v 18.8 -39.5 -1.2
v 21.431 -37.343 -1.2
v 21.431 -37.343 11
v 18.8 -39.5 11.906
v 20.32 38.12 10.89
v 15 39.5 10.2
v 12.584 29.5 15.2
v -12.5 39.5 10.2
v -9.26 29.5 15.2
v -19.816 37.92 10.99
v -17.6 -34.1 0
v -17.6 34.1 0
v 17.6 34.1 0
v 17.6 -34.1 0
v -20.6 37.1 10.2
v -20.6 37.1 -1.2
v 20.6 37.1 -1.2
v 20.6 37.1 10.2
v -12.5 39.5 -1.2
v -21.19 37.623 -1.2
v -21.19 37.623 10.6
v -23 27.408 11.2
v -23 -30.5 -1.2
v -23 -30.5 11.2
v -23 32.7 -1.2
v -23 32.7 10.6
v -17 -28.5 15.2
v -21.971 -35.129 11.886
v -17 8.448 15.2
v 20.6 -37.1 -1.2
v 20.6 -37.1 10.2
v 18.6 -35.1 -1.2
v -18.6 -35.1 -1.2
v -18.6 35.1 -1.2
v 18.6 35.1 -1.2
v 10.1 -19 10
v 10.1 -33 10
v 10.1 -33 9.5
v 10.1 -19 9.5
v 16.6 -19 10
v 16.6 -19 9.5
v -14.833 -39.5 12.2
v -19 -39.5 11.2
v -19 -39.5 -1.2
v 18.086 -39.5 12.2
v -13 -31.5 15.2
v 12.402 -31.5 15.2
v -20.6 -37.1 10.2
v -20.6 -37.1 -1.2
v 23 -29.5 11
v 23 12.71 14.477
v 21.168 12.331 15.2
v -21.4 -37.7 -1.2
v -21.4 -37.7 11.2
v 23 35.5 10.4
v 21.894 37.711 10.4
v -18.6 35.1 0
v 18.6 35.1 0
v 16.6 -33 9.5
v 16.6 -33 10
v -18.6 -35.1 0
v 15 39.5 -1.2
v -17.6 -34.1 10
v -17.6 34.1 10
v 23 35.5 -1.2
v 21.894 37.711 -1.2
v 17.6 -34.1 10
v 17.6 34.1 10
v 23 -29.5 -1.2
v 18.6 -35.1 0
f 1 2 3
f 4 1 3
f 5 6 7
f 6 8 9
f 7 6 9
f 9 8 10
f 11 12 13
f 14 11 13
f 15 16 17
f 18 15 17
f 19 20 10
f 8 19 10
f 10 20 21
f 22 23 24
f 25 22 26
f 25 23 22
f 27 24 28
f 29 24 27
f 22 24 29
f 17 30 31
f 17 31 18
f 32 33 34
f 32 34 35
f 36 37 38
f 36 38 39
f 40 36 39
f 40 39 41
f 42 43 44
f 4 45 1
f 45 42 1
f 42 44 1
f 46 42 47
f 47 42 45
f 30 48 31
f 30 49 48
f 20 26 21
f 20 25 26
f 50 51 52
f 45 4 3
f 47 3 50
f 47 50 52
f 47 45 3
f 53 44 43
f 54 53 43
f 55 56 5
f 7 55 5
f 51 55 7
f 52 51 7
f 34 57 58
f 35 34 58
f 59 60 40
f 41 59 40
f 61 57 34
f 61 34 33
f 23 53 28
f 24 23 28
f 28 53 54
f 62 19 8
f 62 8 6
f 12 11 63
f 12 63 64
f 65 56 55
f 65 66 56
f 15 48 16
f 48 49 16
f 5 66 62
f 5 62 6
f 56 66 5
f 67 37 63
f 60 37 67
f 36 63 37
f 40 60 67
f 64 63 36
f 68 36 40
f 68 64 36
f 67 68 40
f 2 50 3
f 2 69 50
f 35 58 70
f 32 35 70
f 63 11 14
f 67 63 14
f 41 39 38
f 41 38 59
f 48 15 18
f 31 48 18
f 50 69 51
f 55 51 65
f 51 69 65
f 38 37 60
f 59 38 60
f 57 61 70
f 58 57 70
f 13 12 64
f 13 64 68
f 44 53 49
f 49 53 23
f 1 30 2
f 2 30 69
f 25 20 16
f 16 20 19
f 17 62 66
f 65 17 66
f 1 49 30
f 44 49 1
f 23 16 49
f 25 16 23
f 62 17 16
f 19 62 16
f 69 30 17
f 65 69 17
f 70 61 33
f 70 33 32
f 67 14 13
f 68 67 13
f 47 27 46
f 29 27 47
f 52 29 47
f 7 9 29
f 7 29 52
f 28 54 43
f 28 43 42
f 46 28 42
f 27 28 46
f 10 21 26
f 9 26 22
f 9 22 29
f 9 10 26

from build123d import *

# Parameters (mm, degrees)
F0_W          = 35.2
F0_H          = 68.2
F1_DEPTH      = 10
F2_W          = 6.5
F2_H          = 14
F3_DEPTH      = 0.5
F4_W          = 37.2
F4_H          = 70.2
F5_DEPTH      = 1.2
F6_W          = 46
F6_H          = 79
F6_W_2        = 41.2
F6_H_2        = 74.2
F7_DEPTH      = 11.2
F7_DEPTH_BACK = 0.2
F8_W          = 46
F8_H          = 79
F9_DEPTH      = 5
F10_T1_DEPTH  = 68.3626417259
F11_SIZE2     = 4
F11_SIZE      = 3
F12_T1_DEPTH  = 51.679588215
F13_T1_DEPTH  = 37.1186309903
F14_T1_DEPTH  = 105.3432147832
F15_T1_DEPTH  = 56.8622727826
F16_T1_DEPTH  = 113.8975360582
F17_T1_DEPTH  = 66.7068632941
F18_T1_DEPTH  = 64.9639966922
F19_T1_DEPTH  = 78.1392222347
F20_SIZE2     = 3
F20_SIZE      = 8
F21_SIZE      = 2.2
F22_SIZE2     = 2
F22_SIZE      = 8
F23_SIZE2     = 2
F23_SIZE      = 6
F24_SIZE2     = 2
F24_SIZE      = 6


# Not quite as in the source:
# - a fillet or chamfer that OpenCascade refuses, or shapes differently, is made with other operations: its cross-section is extruded or revolved along the edge and cut away or added


with BuildPart() as f1:
    # F0 (on Top) → F1 (new body)
    with BuildSketch(Plane.XY):
        Rectangle(F0_W, F0_H)
    extrude(amount=F1_DEPTH)

    # F2 (on face) → F3 (cut)
    with BuildSketch(Plane.XY.offset(10)):
        with Locations((13.35, -26)):
            Rectangle(F2_W, F2_H)
    extrude(amount=-F3_DEPTH, mode=Mode.SUBTRACT)


with BuildPart() as f5:
    # F4 (on face) → F5 (new body)
    with BuildSketch(Plane(origin=(0, 0, 0), x_dir=(1, 0, 0), z_dir=(0, 0, -1))):
        Rectangle(F4_W, F4_H)
    extrude(amount=F5_DEPTH)


with BuildPart() as f7:
    # F6 (on face) → F7 (new body, two sides)
    with BuildSketch(Plane.XY.offset(10)) as f7_sk:
        Rectangle(F6_W, F6_H)
        Rectangle(F6_W_2, F6_H_2, mode=Mode.SUBTRACT)
    extrude(amount=-F7_DEPTH)
    extrude(f7_sk.sketch, amount=F7_DEPTH_BACK)

    # F8 (on face) → F9 (join)
    with BuildSketch(Plane.XY.offset(10.2)):
        Rectangle(F8_W, F8_H)
    extrude(amount=F9_DEPTH)

    # F10: chamfer of 2 x 10 on 1 edges, made by hand

    # F10_s2 → F10_t1 (cut)
    with BuildSketch(Plane.XY.offset(-27.181320863)):
        Polygon((23, -29.5), (21, -39.5), (23, -39.5), align=None)
    extrude(amount=F10_T1_DEPTH, mode=Mode.SUBTRACT)

    # F11
    f11_edges = [f7.edges().sort_by_distance(p)[0] for p in [
        (-23, -39.5, 7),
    ]]
    chamfer(f11_edges, length=F11_SIZE, length2=F11_SIZE2)

    # F12: chamfer of 2.5 x 6.8 on 1 edges, made by hand

    # F12_s2 → F12_t1 (cut)
    with BuildSketch(Plane.XY.offset(-18.8397941075)):
        Polygon((-23, 32.7), (-20.5, 39.5), (-23, 39.5), align=None)
    extrude(amount=F12_T1_DEPTH, mode=Mode.SUBTRACT)

    # F13: chamfer of 4 x 2 on 1 edges, made by hand

    # F13_s2 → F13_t1 (cut)
    with BuildSketch(Plane.XY.offset(-11.5593154951)):
        Polygon((21, 39.5), (23, 35.5), (23, 39.5), align=None)
    extrude(amount=F13_T1_DEPTH, mode=Mode.SUBTRACT)

    # F14: chamfer of 14 x 4.6 on 1 edges, made by hand

    # F14_s2 → F14_t1 (cut)
    with BuildSketch(Plane(origin=(22.8891289585, 62.258430767, 0), x_dir=(0, 0, 1), z_dir=(-0.3450656446, -0.9385785534, 0))):
        Polygon((10.6, 32.8709533075), (15.2, 18.8709533075), (15.2, 32.8709533075), align=None)
    extrude(amount=F14_T1_DEPTH, mode=Mode.SUBTRACT)

    # F15: chamfer of 10 x 4 on 1 edges, made by hand

    # F15_s2 → F15_t1 (cut)
    with BuildSketch(Plane(origin=(-17.944909113, 13.4586818348, 0), x_dir=(0, 0, 1), z_dir=(0.8, -0.6, 0))):
        Polygon((11.2, 43), (15.2, 33), (15.2, 43), align=None)
    extrude(amount=F15_T1_DEPTH, mode=Mode.SUBTRACT)

    # F16: chamfer of 10 x 4.2 on 1 edges, made by hand

    # F16_s2 → F16_t1 (cut)
    with BuildSketch(Plane(origin=(-11.8727476818, -59.3637384092, 0), x_dir=(0, 0, 1), z_dir=(0.1961161351, 0.9805806757, 0))):
        Polygon((11, 28.3387815275), (15.2, 18.3387815275), (15.2, 28.3387815275), align=None)
    extrude(amount=F16_T1_DEPTH, mode=Mode.SUBTRACT)

    # F17: chamfer of 12 x 4.8 on 1 edges, made by hand

    # F17_s2 → F17_t1 (cut)
    with BuildSketch(Plane(origin=(4.3161080891, -8.6322161783, 0), x_dir=(0, 0, 1), z_dir=(-0.4472135955, 0.894427191, 0))):
        Polygon((10.4, 36.4479080332), (15.2, 24.4479080332), (15.2, 36.4479080332), align=None)
    extrude(amount=F17_T1_DEPTH, mode=Mode.SUBTRACT)

    # F18: chamfer of 5 x 10 on 1 edges, made by hand

    # F18_s2 → F18_t1 (cut)
    with BuildSketch(Plane.YZ.offset(-31.4821158194)):
        Polygon((39.5, 10.2), (29.5, 15.2), (39.5, 15.2), align=None)
    extrude(amount=F18_T1_DEPTH, mode=Mode.SUBTRACT)

    # F19: chamfer of 4 x 6 on 1 edges, made by hand

    # F19_s2 → F19_t1 (cut)
    with BuildSketch(Plane.XZ.offset(-38.6364190914)):
        Polygon((-23, 11.2), (-17, 15.2), (-23, 15.2), align=None)
    extrude(amount=F19_T1_DEPTH, mode=Mode.SUBTRACT)

    # F20
    f20_edges = [f7.edges().sort_by_distance(p)[0] for p in [
        (4.234314, -39.5, 15.2),
    ]]
    f20_side = f7.faces().sort_by_distance((0.719932, -3.706312, 15.2))[0]
    chamfer(f20_edges, length=F20_SIZE, length2=F20_SIZE2, reference=f20_side)

    # F21
    f21_edges = [f7.edges().sort_by_distance(p)[0] for p in [
        (21, -39.5, 4.9),
    ]]
    chamfer(f21_edges, length=F21_SIZE)

    # F22
    f22_edges = [f7.edges().sort_by_distance(p)[0] for p in [
        (-20.5, 39.5, 4.5),
    ]]
    chamfer(f22_edges, length=F22_SIZE, length2=F22_SIZE2)

    # F23
    f23_edges = [f7.edges().sort_by_distance(p)[0] for p in [
        (21, 39.5, 4.5),
    ]]
    chamfer(f23_edges, length=F23_SIZE, length2=F23_SIZE2)

    # F24
    f24_edges = [f7.edges().sort_by_distance(p)[0] for p in [
        (-23, -36.5, 5),
    ]]
    chamfer(f24_edges, length=F24_SIZE, length2=F24_SIZE2)


solid = Compound([f1.part, f5.part, f7.part])
